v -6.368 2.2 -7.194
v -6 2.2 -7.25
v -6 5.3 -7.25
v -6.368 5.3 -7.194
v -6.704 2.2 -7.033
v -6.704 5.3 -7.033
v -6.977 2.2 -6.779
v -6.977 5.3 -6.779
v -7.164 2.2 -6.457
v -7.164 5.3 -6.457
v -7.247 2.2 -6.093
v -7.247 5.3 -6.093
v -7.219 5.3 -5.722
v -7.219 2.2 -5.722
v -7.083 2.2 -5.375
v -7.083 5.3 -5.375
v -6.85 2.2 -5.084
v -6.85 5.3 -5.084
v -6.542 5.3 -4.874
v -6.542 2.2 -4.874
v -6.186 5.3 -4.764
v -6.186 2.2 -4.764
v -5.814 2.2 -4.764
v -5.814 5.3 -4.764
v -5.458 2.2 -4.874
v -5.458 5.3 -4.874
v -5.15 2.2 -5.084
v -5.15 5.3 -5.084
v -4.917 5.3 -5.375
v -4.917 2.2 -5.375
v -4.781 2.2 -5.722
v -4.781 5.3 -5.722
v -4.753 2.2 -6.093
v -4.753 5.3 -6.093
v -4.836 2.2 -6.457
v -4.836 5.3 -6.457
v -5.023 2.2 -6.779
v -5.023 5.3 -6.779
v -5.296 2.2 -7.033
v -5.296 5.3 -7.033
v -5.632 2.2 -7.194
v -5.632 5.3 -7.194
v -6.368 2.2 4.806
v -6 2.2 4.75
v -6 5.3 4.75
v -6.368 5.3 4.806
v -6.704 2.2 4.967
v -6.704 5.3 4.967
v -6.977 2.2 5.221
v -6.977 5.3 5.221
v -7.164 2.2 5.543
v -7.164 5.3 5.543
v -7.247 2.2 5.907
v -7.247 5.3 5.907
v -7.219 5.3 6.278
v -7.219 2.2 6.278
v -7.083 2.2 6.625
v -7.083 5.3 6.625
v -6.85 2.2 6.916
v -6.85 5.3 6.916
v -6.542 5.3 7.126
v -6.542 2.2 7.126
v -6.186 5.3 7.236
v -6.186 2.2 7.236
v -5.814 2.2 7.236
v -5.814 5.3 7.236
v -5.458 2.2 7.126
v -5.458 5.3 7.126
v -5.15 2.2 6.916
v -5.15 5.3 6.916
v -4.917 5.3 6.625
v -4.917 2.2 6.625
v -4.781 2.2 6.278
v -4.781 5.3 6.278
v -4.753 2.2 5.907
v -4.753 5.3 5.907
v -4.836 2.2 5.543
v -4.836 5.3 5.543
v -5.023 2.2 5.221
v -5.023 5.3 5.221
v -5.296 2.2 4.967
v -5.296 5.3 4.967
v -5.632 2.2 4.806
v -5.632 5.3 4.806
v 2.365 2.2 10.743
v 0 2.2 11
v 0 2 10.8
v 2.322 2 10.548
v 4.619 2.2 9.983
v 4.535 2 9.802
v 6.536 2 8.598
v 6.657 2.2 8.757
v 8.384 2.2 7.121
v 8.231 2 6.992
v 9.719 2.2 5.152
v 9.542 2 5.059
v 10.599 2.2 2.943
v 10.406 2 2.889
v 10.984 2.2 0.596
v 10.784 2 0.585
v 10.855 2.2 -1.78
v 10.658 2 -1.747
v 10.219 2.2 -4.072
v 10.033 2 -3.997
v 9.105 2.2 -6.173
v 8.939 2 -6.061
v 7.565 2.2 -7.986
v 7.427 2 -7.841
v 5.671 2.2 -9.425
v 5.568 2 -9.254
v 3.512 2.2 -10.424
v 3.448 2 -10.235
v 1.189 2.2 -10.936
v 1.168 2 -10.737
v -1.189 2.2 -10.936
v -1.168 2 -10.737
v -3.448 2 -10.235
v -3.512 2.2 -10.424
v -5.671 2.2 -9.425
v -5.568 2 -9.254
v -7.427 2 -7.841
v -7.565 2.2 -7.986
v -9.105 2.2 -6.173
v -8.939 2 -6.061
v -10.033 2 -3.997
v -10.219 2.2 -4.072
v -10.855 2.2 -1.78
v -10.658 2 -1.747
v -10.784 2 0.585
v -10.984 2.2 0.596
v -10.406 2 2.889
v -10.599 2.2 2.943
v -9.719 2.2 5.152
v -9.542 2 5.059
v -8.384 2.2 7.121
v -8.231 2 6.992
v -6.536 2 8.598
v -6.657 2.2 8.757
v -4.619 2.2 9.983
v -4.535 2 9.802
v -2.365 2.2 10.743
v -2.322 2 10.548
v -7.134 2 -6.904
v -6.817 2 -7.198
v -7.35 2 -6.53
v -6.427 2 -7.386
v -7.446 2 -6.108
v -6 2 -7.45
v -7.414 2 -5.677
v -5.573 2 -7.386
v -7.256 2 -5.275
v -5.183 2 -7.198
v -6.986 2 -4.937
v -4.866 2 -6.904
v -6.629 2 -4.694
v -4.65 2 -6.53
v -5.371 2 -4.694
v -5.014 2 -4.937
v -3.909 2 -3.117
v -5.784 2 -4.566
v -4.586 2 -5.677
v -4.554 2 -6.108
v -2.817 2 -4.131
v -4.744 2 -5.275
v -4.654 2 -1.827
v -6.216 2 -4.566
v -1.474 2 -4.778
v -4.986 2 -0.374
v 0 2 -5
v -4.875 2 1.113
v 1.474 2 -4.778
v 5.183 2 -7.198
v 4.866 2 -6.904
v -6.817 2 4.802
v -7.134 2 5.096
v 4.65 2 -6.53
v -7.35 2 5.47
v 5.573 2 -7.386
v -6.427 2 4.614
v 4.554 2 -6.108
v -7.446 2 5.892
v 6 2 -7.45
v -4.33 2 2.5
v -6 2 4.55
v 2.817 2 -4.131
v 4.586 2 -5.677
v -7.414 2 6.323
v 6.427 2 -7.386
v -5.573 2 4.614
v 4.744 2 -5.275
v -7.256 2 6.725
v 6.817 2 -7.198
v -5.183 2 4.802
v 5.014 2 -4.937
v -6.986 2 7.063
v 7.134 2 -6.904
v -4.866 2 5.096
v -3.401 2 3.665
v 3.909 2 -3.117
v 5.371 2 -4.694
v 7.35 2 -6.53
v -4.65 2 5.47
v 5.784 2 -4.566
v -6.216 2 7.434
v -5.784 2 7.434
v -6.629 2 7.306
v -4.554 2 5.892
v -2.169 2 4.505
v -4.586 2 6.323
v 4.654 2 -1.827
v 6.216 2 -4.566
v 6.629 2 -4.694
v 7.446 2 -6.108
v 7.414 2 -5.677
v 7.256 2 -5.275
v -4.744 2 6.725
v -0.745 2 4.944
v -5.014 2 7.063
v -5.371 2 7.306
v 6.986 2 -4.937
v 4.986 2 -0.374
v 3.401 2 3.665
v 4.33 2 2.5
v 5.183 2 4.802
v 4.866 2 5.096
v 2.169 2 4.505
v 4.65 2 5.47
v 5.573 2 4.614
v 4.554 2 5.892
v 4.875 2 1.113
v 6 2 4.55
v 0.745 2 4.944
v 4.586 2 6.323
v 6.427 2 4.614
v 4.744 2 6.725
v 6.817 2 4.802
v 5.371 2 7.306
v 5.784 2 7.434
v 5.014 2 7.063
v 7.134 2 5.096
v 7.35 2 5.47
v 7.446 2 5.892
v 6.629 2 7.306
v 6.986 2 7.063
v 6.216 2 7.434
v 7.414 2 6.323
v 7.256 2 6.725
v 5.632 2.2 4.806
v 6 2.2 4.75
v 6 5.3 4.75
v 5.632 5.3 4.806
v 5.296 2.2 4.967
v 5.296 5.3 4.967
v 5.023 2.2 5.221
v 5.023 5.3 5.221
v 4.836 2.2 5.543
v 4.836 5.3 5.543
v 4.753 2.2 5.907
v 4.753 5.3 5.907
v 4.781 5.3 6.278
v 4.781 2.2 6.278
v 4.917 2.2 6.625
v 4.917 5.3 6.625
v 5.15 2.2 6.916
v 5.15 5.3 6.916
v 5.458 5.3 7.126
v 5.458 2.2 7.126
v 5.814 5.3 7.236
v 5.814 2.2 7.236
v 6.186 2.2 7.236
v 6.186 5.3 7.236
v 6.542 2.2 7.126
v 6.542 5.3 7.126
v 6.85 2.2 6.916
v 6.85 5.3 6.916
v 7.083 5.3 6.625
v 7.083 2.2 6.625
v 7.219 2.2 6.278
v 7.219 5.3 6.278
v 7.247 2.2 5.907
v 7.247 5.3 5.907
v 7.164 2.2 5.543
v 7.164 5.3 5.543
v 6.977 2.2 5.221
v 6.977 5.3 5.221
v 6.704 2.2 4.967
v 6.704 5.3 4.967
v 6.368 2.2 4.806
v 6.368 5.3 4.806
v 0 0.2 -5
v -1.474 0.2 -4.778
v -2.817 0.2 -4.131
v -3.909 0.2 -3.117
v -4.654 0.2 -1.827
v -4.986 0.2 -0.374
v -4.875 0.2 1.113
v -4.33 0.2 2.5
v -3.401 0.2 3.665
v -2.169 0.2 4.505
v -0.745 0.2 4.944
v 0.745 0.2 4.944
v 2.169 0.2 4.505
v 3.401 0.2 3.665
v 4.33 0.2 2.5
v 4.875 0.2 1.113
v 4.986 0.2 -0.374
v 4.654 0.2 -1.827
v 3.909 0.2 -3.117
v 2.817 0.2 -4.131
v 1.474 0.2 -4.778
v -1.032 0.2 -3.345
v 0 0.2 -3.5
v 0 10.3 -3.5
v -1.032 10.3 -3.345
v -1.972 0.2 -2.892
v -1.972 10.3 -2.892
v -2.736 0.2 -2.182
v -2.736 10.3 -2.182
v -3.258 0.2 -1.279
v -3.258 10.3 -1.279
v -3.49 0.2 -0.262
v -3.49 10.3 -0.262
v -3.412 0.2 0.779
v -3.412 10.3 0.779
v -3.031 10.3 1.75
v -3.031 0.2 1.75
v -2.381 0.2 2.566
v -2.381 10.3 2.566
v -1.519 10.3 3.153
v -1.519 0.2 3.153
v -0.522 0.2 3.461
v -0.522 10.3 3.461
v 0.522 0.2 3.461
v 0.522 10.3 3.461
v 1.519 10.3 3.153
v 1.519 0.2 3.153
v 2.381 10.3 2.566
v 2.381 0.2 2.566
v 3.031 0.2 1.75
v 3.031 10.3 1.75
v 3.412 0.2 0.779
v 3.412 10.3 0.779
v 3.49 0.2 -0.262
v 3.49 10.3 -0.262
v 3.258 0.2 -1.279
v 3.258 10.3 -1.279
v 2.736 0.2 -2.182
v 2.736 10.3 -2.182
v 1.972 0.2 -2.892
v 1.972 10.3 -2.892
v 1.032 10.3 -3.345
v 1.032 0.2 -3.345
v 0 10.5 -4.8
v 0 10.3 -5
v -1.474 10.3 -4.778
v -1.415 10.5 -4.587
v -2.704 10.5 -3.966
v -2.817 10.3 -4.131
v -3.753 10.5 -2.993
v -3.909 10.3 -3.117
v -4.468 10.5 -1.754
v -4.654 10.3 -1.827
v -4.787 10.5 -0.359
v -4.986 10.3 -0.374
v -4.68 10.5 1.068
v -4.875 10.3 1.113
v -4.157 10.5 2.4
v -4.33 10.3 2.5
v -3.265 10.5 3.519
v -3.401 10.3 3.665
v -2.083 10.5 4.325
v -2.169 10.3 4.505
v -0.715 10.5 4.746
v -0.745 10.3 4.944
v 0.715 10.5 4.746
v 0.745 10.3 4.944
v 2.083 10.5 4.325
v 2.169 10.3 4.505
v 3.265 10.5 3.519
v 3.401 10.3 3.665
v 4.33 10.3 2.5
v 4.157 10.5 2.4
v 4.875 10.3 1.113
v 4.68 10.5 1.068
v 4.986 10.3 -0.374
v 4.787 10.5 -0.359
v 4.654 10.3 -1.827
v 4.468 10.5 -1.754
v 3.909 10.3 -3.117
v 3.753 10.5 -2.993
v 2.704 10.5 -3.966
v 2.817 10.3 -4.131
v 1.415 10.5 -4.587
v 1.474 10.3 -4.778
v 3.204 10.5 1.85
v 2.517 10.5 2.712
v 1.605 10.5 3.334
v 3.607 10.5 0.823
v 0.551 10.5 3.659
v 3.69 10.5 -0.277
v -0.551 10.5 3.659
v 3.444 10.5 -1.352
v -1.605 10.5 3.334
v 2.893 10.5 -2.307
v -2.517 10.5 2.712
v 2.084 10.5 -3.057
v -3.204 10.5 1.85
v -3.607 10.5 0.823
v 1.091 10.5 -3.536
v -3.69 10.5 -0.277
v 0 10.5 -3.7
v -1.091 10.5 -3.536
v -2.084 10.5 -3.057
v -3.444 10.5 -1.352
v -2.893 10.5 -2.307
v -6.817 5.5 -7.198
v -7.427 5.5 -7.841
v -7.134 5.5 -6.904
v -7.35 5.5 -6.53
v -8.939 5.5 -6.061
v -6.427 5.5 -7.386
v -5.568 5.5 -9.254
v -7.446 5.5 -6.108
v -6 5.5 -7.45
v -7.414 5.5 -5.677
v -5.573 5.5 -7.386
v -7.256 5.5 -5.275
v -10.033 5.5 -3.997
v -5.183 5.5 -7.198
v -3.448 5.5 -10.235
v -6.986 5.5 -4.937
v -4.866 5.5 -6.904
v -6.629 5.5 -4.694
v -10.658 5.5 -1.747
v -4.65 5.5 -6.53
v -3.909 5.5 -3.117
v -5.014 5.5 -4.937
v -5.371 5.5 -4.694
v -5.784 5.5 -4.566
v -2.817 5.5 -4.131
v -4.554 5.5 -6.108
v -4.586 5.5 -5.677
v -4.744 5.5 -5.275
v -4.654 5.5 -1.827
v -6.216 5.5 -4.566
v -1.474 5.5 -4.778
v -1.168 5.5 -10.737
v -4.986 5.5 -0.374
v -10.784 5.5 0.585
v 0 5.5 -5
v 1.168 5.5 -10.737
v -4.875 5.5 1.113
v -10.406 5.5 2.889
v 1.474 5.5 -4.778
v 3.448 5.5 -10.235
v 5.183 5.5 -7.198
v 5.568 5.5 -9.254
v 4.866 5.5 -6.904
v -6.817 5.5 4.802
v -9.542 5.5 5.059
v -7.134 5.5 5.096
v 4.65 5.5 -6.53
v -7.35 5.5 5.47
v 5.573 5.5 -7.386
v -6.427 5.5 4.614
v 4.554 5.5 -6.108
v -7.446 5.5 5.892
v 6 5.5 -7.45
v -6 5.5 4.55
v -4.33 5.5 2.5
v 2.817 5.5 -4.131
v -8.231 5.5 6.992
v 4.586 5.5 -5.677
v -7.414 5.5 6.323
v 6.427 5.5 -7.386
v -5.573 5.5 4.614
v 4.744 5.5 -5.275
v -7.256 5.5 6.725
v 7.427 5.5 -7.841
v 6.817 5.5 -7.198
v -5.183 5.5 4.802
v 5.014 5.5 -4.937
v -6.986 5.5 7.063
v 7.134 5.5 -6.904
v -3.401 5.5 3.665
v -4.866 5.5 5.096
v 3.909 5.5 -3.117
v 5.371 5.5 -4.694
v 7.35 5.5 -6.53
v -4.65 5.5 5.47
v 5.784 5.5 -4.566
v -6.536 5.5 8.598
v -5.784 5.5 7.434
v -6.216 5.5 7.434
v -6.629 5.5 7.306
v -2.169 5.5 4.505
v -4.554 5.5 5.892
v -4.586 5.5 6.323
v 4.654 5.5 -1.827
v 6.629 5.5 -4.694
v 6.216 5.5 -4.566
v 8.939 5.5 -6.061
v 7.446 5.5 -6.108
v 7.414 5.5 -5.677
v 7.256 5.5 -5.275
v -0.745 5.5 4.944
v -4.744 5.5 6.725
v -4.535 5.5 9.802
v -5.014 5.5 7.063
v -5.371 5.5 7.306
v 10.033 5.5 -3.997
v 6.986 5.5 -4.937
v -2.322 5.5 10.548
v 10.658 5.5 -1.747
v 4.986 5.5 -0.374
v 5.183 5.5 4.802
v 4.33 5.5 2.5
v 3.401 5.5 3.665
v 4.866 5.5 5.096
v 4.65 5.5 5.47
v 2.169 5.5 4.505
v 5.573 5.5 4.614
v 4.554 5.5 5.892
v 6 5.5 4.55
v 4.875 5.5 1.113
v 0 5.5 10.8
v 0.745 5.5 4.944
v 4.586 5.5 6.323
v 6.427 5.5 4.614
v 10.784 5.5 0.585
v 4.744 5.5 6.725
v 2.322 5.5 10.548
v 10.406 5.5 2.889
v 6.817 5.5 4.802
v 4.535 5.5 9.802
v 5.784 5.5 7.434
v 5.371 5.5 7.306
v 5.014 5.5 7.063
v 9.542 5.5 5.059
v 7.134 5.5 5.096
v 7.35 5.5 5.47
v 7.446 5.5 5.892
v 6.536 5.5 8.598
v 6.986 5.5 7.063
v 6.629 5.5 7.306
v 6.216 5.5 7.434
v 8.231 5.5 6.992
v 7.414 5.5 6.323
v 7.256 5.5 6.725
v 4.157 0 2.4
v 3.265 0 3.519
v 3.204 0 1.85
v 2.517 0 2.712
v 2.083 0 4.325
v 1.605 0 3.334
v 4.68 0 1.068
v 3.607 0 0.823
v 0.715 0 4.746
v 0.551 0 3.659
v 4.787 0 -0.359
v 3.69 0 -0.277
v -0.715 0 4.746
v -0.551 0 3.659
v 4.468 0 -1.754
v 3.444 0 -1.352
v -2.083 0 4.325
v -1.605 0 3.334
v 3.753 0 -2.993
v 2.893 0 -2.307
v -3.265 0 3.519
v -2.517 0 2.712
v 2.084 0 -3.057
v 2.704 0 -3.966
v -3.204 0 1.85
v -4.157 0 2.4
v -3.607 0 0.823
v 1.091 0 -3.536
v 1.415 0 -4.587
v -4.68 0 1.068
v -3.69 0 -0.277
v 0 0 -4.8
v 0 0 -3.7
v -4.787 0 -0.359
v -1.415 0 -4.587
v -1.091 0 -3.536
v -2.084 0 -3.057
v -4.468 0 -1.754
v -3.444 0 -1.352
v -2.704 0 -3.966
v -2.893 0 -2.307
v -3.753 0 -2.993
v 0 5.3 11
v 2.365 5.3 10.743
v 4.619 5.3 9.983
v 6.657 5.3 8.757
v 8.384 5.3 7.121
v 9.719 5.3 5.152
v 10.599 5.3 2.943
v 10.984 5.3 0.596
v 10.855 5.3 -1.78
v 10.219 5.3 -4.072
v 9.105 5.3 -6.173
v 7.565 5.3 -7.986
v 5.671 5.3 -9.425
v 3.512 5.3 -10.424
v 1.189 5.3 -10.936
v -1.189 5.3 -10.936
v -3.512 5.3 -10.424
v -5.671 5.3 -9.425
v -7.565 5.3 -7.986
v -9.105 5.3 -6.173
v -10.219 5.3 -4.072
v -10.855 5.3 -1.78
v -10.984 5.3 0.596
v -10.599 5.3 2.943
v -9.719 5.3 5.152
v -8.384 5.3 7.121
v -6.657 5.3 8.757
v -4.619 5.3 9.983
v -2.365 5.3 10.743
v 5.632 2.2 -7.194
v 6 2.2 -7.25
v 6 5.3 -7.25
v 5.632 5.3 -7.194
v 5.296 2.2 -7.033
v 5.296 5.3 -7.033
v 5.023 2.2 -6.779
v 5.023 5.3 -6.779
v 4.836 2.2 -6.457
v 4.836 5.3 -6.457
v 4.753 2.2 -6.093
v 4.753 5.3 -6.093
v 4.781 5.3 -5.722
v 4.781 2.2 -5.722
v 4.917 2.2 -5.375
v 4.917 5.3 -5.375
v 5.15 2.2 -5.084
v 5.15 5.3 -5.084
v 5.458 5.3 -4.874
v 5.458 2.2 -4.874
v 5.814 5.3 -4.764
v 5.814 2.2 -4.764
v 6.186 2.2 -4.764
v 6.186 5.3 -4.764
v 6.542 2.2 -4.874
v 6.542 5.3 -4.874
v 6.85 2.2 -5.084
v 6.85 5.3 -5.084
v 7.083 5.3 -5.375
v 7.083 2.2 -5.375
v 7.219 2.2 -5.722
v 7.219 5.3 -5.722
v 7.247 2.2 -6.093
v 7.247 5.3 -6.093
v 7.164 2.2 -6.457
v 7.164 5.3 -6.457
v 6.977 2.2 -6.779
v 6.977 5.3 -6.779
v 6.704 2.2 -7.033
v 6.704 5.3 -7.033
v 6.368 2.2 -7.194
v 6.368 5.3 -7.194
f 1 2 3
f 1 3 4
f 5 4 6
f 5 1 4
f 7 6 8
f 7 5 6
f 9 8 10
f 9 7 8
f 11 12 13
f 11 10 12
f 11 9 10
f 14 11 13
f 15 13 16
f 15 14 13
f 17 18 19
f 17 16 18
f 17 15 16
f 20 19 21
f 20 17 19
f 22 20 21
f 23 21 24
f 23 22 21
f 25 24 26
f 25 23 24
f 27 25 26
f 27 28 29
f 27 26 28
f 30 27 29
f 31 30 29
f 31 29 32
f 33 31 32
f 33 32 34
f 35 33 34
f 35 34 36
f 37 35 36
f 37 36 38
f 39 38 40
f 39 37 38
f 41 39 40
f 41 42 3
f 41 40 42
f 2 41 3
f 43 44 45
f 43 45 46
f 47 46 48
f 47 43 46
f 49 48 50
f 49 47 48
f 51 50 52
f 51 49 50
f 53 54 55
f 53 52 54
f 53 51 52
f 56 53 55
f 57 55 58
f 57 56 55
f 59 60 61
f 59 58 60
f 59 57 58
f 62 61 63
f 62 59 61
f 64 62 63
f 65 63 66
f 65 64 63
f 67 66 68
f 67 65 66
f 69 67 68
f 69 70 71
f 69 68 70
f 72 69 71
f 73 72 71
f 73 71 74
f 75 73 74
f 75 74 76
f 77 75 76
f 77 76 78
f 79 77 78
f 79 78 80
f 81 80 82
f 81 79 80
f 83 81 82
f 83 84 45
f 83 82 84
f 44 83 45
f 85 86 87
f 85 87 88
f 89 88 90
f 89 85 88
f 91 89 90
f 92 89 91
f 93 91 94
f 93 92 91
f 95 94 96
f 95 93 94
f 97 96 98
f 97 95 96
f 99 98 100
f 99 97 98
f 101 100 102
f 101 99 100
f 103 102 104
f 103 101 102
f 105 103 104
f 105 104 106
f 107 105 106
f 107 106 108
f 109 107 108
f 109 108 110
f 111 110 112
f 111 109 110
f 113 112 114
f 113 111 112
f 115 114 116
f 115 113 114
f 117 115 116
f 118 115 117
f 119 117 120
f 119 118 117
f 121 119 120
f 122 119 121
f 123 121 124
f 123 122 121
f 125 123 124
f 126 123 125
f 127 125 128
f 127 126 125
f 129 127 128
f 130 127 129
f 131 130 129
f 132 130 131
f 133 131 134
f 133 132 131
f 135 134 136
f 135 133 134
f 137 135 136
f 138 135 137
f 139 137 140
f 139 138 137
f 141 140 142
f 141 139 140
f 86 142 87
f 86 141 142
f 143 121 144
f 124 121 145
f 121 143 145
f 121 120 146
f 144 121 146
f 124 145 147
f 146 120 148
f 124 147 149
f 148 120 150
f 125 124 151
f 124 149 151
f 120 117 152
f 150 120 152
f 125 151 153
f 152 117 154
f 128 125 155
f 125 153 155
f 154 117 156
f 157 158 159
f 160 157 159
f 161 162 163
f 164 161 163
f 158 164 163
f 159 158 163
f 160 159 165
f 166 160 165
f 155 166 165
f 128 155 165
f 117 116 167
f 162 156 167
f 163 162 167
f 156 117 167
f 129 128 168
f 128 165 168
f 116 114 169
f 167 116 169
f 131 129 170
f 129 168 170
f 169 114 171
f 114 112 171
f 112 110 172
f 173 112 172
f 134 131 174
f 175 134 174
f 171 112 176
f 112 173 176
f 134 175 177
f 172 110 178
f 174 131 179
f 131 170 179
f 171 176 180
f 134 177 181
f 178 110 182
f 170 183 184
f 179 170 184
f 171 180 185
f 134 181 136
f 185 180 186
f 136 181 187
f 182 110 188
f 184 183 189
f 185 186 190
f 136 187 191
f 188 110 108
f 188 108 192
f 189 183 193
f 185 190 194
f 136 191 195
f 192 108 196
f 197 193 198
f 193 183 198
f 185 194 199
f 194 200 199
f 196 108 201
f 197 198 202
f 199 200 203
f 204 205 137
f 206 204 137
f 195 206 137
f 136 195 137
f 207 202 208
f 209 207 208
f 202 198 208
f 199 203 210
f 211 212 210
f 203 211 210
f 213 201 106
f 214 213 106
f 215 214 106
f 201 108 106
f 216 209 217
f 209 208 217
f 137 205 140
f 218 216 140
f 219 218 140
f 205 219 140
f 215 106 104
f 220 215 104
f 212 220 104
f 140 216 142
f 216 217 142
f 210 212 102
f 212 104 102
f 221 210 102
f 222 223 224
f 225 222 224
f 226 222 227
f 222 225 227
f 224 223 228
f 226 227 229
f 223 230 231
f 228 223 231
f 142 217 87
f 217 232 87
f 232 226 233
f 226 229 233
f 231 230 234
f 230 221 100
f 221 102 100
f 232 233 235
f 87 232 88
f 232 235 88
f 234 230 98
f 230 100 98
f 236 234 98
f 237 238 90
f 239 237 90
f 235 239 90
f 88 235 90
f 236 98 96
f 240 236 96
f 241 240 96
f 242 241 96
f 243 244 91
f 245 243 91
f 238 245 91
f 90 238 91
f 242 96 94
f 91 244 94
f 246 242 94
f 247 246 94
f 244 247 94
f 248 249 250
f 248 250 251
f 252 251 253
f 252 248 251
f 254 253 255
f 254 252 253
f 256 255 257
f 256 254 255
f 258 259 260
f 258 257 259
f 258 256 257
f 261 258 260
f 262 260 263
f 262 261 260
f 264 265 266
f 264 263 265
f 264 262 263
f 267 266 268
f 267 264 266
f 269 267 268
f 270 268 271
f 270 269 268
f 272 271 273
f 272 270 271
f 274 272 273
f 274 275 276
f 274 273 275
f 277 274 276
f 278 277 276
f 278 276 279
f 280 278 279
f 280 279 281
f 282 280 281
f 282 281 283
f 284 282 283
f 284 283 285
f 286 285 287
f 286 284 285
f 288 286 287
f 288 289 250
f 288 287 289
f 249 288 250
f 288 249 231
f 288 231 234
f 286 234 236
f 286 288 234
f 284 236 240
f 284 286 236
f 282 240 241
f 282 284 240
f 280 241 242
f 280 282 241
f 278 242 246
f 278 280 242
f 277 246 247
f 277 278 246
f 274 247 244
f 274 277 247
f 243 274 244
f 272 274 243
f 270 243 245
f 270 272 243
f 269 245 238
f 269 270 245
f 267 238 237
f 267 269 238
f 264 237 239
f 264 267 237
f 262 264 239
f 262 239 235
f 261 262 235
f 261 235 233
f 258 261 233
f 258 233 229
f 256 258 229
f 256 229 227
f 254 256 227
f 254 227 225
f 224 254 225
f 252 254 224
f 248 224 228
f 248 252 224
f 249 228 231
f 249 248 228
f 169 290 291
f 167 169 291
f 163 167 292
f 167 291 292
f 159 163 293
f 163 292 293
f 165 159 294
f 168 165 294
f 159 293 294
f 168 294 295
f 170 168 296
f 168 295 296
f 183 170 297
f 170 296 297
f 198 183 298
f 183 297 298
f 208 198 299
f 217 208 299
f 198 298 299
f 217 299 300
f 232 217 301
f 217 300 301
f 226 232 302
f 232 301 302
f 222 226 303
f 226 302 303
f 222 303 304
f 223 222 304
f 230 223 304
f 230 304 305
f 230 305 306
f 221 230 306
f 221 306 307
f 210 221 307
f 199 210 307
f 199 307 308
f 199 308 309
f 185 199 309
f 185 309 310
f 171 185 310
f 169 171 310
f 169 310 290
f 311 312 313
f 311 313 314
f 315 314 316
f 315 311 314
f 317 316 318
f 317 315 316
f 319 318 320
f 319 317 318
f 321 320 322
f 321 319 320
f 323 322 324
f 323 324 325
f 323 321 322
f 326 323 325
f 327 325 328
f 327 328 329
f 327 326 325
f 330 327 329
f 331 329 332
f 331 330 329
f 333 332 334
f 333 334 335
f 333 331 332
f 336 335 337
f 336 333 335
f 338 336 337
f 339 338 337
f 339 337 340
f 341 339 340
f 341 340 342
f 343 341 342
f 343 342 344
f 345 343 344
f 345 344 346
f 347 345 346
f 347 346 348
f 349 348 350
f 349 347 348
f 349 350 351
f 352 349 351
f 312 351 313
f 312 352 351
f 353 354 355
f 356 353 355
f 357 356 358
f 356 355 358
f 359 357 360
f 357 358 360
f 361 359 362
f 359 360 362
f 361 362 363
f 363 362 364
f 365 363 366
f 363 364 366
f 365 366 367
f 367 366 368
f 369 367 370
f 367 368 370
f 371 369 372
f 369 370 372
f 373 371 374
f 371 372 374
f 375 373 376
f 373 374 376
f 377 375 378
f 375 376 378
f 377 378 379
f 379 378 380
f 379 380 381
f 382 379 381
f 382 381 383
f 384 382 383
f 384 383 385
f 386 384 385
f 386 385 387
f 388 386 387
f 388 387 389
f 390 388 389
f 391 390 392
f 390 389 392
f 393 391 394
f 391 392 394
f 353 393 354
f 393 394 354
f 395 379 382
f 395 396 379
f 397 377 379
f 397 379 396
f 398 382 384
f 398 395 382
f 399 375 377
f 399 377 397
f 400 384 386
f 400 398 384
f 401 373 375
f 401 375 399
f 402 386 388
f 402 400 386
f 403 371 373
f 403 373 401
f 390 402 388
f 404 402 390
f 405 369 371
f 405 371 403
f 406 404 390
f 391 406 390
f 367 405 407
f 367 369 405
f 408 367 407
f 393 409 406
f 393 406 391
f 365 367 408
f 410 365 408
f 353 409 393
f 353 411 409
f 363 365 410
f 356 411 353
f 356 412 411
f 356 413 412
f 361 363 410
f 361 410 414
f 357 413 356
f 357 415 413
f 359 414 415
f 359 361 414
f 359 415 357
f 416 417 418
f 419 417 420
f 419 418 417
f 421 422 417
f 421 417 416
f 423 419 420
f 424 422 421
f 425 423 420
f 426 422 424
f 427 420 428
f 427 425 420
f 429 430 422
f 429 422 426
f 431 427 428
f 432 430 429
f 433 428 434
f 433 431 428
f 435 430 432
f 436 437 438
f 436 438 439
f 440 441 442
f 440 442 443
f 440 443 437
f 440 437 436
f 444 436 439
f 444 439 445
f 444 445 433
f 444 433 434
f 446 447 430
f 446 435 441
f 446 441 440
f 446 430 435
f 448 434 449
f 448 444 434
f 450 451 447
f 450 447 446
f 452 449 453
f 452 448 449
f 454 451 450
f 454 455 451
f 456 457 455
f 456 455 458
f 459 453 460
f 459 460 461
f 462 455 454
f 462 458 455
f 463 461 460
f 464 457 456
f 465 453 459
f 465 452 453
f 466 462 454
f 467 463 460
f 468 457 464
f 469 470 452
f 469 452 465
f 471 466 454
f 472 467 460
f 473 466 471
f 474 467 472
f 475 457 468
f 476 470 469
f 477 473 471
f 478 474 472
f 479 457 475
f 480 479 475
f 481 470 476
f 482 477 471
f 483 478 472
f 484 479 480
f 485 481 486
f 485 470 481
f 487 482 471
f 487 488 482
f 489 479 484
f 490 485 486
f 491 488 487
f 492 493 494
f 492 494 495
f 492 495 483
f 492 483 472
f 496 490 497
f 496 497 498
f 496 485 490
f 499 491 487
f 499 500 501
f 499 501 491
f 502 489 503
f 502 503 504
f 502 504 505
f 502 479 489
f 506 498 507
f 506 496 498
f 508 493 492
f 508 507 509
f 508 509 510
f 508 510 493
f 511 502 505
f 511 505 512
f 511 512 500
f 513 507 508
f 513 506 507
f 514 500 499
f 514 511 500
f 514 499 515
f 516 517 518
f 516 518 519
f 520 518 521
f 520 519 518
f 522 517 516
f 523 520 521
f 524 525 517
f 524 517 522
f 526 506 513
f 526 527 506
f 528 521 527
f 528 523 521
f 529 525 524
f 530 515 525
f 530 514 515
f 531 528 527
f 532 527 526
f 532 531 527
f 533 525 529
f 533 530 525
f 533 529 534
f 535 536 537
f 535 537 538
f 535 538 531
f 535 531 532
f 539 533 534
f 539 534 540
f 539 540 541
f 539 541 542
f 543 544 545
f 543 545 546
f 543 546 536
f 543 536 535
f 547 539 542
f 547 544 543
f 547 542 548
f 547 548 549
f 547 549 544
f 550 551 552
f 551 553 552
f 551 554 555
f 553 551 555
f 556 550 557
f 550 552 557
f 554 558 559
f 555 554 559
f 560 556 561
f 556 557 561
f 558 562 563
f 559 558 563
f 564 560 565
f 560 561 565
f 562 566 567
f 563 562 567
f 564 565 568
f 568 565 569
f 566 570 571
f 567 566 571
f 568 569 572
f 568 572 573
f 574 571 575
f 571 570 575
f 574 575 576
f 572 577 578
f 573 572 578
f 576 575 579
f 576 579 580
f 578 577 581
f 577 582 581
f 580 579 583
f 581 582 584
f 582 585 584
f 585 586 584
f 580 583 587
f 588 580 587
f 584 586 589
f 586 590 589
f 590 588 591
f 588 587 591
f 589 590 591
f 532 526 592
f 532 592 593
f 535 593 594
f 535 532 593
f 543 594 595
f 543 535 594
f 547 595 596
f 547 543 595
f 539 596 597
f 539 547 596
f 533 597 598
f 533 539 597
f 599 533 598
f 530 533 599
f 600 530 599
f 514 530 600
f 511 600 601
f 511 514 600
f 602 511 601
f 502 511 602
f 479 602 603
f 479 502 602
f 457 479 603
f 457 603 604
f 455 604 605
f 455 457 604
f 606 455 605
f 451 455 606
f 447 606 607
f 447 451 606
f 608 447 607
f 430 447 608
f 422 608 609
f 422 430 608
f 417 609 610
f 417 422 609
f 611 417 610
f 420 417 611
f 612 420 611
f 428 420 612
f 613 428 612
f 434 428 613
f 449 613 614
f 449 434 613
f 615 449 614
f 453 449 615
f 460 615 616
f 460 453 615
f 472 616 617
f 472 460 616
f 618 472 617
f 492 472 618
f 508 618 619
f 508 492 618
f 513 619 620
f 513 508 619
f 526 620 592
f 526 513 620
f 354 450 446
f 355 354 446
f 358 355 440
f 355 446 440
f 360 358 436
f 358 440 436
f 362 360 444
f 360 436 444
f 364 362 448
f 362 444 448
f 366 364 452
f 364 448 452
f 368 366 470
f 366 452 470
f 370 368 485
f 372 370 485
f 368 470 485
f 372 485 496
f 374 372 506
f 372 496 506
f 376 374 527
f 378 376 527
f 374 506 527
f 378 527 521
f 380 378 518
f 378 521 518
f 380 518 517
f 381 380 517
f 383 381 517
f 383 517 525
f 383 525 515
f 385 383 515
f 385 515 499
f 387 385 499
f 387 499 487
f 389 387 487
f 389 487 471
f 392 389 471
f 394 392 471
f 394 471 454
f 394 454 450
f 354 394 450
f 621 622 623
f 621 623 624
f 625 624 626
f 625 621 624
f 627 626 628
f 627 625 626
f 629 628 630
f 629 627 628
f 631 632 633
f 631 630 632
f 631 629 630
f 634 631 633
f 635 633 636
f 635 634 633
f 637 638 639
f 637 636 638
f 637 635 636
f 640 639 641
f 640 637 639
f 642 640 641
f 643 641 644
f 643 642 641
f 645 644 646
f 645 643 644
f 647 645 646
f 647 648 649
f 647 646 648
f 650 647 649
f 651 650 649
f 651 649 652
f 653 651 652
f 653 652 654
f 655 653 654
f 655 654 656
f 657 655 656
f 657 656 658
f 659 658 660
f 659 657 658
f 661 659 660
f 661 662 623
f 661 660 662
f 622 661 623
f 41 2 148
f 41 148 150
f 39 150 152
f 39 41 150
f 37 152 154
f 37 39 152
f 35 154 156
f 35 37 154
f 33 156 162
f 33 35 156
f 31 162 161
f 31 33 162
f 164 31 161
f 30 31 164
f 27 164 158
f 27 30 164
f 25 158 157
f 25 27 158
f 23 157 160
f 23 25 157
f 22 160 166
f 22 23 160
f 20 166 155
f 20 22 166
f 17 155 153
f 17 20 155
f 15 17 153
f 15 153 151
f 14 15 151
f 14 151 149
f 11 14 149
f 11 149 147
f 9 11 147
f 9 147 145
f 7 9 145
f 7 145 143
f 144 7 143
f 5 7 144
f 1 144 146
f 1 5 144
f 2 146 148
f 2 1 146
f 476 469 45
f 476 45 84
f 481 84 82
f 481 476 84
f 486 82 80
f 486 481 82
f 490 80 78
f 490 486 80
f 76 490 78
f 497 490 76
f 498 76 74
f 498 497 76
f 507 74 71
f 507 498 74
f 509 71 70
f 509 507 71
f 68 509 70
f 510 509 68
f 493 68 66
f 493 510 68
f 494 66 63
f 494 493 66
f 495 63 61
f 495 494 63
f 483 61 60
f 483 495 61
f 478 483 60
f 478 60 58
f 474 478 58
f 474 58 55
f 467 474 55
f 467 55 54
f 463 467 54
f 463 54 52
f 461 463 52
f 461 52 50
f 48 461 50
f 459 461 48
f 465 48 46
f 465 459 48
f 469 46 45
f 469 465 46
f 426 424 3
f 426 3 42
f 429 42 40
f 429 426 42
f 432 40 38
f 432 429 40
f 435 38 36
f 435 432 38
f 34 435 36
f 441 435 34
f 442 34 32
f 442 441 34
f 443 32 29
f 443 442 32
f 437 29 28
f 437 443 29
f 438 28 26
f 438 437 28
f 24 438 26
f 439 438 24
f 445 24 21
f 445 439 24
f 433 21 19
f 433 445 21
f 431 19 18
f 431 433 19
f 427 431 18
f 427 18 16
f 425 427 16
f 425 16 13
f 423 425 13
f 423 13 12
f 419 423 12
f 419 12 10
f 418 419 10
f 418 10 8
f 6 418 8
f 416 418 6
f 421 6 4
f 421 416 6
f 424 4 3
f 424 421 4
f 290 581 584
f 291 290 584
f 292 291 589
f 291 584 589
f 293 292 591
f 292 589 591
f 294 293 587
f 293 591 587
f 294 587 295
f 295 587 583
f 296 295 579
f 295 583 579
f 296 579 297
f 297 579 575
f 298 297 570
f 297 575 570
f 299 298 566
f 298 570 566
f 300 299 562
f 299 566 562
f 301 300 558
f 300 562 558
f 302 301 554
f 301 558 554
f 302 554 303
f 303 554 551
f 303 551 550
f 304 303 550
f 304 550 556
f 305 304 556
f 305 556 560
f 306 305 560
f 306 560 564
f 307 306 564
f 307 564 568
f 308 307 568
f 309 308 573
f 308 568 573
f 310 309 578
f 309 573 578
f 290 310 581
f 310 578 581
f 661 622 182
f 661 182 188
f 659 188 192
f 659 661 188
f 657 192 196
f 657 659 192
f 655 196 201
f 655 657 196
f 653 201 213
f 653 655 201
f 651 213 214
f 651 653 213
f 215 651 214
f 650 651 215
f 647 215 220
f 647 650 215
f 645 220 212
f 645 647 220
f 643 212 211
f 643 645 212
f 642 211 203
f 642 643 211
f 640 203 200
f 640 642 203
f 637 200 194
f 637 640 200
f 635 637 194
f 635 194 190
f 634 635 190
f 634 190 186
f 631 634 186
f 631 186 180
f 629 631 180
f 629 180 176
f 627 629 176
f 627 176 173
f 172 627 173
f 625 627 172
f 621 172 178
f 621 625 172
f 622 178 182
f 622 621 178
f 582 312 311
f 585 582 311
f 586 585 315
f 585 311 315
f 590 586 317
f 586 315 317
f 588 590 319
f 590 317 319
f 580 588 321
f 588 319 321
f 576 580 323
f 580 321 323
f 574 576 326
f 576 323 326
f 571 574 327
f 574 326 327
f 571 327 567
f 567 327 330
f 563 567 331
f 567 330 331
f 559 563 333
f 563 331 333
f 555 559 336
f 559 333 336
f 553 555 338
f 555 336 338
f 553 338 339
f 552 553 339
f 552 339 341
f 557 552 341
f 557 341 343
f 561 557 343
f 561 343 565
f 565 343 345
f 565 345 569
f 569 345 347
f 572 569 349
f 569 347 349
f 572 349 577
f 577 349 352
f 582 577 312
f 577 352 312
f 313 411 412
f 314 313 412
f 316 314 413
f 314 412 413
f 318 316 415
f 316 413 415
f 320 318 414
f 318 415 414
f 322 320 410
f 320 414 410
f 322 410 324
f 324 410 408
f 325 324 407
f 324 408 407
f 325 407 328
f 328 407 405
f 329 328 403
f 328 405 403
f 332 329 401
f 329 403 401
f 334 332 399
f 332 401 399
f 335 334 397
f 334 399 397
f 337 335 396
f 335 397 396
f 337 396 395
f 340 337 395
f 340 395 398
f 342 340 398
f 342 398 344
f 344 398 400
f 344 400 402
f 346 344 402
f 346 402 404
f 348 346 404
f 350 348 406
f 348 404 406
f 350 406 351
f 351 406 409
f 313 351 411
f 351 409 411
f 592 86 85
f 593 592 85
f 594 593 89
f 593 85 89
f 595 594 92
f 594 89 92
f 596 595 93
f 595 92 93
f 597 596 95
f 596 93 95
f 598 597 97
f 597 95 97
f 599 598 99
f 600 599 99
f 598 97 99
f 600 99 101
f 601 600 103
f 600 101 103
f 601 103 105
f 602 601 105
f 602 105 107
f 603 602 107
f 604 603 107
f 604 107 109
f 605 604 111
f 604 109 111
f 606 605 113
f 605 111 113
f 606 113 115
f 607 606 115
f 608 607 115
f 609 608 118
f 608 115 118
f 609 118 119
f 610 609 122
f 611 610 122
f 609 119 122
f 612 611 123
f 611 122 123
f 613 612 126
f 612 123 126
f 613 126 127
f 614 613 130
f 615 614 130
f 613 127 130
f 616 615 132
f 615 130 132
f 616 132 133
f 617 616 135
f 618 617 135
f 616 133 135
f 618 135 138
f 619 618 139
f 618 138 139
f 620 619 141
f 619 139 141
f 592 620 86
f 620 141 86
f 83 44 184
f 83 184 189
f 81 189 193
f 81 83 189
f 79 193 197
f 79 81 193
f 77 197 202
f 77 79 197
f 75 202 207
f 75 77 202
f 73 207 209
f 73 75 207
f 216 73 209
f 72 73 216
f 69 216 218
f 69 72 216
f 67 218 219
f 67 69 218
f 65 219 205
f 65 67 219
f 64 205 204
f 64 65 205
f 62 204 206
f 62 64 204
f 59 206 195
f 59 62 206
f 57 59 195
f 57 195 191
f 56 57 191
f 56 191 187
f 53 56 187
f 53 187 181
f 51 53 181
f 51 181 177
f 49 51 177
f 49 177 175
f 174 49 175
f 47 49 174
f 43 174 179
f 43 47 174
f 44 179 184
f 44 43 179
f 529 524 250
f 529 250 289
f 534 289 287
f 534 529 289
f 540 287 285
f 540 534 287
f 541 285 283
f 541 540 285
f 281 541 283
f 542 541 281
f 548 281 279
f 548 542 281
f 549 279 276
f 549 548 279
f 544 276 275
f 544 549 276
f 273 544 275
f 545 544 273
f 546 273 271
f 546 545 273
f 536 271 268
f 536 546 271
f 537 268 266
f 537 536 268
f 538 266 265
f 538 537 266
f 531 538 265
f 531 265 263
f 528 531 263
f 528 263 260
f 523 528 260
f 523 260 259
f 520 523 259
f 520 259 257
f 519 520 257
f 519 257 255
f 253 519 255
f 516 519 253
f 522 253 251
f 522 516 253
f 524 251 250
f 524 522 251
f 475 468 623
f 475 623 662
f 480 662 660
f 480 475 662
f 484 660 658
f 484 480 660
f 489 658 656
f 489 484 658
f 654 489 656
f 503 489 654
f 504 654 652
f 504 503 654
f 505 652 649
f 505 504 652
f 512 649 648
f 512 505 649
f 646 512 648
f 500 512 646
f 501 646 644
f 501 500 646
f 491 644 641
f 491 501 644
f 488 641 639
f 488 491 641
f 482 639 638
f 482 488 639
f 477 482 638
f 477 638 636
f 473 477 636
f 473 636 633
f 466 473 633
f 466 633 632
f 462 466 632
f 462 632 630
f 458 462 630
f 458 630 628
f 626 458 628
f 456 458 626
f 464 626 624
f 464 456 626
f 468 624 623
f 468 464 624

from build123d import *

# Parameters (mm, degrees)
SKETCH1_R           = 5
SKETCH1_R_2         = 3.5
BOSS_EXTRUDE1_DEPTH = 10.5
SKETCH4_R           = 11
SKETCH4_R_2         = 5
BOSS_EXTRUDE2_DEPTH = 3.5
SKETCH5_R           = 1.25
CUT_EXTRUDE2_DEPTH  = 19.768324379
CHAMFER1_SIZE       = 0.2


with BuildPart() as part:
    # Sketch1 → Boss-Extrude1 (new body)
    with BuildSketch(Plane(origin=(0, 0, 0), x_dir=(1, 0, 0), z_dir=(0, 1, 0))):
        with Locations(Location((0, 0, 0), (0, 0, 90))):
            Circle(SKETCH1_R)
        with Locations(Location((0, 0, 0), (0, 0, 90))):
            Circle(SKETCH1_R_2, mode=Mode.SUBTRACT)
    extrude(amount=BOSS_EXTRUDE1_DEPTH)

    # Sketch4 → Boss-Extrude2 (add)
    with BuildSketch(Plane(origin=(0, 2, 0), x_dir=(1, 0, 0), z_dir=(0, 1, 0))):
        with Locations(Location((0, 0, 0), (0, 0, 270))):
            Circle(SKETCH4_R)
        with Locations(Location((0, 0, 0), (0, 0, 90))):
            Circle(SKETCH4_R_2, mode=Mode.SUBTRACT)
    extrude(amount=BOSS_EXTRUDE2_DEPTH)

    # Sketch5 → Cut-Extrude2 (cut, through all)
    with BuildSketch(Plane(origin=(0, 0, 0), x_dir=(1, 0, 0), z_dir=(0, 1, 0))):
        with Locations(Location((-6, 6, 0), (0, 0, 90))):
            Circle(SKETCH5_R)
        with Locations(Location((6, 6, 0), (0, 0, 90))):
            Circle(SKETCH5_R)
        with Locations(Location((6, -6, 0), (0, 0, 90))):
            Circle(SKETCH5_R)
        with Locations(Location((-6, -6, 0), (0, 0, 90))):
            Circle(SKETCH5_R)
    extrude(amount=CUT_EXTRUDE2_DEPTH, mode=Mode.SUBTRACT)

    # Chamfer1
    chamfer1_edges = [part.edges().sort_by_distance(p)[0] for p in [
        (0, 5.5, -11),
        (0, 2, -11),
        (-6, 5.5, -4.75),
        (-6, 2, -4.75),
        (0, 0, 5),
        (6, 5.5, -4.75),
        (6, 2, -4.75),
        (6, 5.5, 7.25),
        (6, 2, 7.25),
        (-6, 5.5, 7.25),
        (-6, 2, 7.25),
        (0, 10.5, 5),
        (0, 0, 3.5),
        (0, 10.5, 3.5),
    ]]
    chamfer(chamfer1_edges, length=CHAMFER1_SIZE)


solid = part.part
